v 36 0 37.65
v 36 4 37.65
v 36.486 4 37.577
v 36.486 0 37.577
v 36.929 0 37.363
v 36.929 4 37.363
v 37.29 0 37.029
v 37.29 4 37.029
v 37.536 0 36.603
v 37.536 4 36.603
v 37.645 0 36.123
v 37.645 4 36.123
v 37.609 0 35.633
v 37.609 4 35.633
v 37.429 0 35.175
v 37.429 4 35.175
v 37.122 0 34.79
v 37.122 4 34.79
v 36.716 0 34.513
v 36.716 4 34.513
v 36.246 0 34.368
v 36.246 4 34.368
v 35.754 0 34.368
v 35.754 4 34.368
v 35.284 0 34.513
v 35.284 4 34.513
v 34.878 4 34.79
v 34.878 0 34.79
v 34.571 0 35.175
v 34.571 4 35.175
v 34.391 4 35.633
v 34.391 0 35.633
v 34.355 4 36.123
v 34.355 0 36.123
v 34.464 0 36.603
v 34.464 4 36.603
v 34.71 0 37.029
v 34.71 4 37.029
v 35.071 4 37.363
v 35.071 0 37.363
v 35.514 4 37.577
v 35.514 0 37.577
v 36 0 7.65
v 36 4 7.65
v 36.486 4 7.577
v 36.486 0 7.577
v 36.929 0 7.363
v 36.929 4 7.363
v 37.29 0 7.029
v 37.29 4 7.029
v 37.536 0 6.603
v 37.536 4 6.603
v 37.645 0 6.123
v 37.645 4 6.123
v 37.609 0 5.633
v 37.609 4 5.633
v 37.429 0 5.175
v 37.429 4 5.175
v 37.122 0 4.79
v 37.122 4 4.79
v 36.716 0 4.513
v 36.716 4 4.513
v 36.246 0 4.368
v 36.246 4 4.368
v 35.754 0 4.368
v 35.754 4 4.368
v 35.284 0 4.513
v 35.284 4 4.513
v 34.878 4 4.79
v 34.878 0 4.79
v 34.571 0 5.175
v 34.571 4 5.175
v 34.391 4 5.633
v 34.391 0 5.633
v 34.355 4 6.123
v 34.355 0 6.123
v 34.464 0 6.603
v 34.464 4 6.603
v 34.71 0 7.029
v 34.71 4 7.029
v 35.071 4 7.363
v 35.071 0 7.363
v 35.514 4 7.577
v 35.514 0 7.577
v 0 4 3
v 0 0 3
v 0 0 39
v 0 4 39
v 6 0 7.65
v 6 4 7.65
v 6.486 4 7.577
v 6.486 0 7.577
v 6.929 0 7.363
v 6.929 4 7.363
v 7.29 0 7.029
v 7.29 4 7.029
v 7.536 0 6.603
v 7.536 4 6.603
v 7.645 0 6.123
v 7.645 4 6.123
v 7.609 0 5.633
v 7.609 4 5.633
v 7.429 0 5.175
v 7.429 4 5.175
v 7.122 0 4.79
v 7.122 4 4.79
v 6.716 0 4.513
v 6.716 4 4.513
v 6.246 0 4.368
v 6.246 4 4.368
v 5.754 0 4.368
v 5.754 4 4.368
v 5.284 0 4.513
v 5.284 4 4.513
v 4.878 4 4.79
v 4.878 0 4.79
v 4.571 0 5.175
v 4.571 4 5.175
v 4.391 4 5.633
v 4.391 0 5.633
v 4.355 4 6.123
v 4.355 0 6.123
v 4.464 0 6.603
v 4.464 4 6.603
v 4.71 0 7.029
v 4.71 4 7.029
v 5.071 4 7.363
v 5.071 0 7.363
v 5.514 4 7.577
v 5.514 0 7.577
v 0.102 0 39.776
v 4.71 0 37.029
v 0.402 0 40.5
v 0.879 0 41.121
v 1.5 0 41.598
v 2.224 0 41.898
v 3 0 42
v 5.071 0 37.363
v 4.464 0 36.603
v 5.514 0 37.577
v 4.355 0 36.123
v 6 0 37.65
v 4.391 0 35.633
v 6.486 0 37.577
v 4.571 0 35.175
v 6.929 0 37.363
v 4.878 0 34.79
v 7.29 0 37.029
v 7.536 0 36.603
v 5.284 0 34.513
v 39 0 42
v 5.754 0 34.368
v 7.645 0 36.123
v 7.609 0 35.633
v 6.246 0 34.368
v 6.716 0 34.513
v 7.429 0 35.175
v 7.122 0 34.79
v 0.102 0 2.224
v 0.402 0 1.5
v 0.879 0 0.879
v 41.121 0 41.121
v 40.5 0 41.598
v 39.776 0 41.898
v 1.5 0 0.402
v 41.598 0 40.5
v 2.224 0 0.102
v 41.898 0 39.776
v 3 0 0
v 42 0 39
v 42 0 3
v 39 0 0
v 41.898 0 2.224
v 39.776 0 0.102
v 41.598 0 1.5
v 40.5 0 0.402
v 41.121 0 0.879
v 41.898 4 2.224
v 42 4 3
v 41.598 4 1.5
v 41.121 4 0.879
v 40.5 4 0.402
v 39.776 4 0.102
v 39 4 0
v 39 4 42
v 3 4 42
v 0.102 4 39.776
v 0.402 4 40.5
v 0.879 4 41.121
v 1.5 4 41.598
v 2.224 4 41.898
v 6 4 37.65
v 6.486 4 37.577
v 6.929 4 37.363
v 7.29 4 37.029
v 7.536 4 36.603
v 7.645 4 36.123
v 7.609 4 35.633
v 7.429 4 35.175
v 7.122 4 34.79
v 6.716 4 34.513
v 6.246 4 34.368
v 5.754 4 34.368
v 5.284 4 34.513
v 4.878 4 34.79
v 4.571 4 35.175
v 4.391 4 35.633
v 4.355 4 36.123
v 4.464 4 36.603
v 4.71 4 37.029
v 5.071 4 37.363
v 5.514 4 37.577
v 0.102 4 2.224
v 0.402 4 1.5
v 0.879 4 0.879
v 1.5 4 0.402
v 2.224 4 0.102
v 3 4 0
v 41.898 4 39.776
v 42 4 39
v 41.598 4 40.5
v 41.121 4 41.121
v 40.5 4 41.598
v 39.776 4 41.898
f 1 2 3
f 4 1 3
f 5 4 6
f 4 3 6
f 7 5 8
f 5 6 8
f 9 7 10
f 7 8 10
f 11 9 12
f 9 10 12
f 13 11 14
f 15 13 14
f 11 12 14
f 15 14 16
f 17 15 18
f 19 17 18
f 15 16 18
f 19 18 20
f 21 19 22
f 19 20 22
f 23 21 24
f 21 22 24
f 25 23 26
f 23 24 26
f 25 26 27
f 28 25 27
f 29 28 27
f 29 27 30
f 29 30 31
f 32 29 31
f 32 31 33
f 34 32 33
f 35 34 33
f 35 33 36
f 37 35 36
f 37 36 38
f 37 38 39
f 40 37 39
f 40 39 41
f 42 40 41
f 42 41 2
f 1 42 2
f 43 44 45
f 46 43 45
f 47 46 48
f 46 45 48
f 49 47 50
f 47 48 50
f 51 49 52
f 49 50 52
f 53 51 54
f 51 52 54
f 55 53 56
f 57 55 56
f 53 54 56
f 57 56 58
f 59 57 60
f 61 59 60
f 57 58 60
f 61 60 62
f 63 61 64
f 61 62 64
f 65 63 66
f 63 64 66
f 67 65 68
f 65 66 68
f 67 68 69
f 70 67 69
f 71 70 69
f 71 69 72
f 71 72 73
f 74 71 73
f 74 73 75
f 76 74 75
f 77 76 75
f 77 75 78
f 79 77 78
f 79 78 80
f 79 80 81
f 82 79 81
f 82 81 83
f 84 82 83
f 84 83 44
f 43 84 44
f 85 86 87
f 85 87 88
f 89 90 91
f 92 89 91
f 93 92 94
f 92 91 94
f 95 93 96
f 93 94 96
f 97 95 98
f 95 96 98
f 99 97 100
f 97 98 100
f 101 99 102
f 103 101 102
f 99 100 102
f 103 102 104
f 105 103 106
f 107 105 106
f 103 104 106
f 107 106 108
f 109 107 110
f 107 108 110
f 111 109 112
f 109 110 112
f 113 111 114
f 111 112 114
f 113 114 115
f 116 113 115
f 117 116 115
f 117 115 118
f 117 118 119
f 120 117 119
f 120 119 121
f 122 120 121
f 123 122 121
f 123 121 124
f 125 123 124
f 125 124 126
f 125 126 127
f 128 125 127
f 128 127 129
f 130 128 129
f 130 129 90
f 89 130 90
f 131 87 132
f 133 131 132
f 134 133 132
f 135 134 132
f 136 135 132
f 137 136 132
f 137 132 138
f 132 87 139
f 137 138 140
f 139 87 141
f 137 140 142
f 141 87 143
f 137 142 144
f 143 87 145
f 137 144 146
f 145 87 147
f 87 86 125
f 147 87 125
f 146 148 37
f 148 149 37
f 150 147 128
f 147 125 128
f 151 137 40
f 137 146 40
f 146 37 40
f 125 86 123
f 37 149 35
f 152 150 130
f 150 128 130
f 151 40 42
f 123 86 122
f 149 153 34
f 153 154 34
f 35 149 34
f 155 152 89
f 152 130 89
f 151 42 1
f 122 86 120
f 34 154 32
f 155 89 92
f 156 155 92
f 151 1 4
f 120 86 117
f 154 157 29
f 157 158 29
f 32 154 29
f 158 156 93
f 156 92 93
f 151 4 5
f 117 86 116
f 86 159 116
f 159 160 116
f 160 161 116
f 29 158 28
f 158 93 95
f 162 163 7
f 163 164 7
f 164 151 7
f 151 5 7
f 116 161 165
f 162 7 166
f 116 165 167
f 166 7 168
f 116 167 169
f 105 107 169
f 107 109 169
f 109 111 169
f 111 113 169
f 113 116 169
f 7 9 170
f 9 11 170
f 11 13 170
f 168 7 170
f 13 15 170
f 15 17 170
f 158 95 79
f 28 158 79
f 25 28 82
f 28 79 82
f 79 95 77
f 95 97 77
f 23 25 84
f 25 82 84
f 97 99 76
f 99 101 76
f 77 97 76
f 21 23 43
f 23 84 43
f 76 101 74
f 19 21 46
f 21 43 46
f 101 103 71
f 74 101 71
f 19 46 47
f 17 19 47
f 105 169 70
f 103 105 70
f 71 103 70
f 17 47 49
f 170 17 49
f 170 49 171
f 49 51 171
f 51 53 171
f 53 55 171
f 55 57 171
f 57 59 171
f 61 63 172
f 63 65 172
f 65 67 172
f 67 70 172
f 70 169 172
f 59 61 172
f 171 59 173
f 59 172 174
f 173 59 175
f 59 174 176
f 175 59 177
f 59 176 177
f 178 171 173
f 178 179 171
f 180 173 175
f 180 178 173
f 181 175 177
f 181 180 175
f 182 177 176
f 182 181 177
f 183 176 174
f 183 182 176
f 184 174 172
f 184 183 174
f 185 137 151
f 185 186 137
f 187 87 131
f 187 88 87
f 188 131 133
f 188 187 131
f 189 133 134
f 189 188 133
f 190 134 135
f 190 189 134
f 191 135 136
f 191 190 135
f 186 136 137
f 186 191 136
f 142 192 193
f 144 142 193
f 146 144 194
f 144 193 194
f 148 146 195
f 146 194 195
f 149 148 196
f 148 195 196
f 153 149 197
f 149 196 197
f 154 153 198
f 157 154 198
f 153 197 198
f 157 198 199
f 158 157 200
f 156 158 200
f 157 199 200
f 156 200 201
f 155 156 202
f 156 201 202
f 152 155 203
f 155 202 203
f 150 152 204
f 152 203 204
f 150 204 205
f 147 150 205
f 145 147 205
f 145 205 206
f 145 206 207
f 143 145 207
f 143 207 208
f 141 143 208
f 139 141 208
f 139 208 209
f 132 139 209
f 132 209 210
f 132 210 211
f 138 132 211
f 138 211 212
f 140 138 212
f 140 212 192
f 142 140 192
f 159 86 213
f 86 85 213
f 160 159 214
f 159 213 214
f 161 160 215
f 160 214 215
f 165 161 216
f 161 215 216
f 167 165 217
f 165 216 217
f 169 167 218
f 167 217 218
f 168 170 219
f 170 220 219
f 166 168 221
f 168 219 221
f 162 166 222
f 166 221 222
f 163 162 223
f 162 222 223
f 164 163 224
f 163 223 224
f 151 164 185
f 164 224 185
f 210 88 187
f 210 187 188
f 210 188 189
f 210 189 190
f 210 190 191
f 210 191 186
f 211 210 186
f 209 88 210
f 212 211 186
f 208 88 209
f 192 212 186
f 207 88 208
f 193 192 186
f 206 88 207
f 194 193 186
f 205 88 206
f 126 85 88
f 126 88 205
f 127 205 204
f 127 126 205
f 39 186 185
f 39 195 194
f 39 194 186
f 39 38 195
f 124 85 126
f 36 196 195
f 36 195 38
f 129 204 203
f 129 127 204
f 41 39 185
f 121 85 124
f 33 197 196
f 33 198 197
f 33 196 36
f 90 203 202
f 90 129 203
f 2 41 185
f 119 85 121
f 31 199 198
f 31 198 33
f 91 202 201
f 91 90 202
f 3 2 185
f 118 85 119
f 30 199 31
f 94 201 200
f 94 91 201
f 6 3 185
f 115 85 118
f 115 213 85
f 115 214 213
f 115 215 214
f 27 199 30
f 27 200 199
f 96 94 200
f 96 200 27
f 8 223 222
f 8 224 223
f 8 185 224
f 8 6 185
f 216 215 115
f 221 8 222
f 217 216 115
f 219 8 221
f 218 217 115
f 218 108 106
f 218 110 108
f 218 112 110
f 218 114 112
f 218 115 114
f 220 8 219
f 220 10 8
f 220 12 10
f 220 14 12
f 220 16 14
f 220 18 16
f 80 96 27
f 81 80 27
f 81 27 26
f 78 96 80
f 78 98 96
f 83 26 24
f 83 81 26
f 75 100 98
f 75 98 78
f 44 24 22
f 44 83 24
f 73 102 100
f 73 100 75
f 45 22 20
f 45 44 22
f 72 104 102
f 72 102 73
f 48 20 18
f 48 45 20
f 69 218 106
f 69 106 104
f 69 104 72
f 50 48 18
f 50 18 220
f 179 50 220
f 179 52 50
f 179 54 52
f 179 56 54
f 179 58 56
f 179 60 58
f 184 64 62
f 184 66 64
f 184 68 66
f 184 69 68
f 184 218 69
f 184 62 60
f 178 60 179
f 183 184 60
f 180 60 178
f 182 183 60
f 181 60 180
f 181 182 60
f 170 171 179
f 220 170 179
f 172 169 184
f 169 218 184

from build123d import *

# Parameters (mm, degrees)
SKETCH_1_W          = 42
SKETCH_1_H          = 4
BLOCKEXTRUDE_DEPTH  = 42
FILLET_2_R          = 3
SKETCH_2_R          = 1.65
MOUNT_HOLE_DEPTH    = 60.531504265
SKETCH_3_R          = 1.65
CUT_EXTRUDE_2_DEPTH = 60.531504265
SKETCH_4_R          = 1.65
CUT_EXTRUDE_3_DEPTH = 60.531504265
SKETCH_5_R          = 1.65
CUT_EXTRUDE_4_DEPTH = 60.531504265


with BuildPart() as part:
    # 草图1 → BlockExtrude (new body)
    with BuildSketch(Plane.XY):
        with Locations((21, 2)):
            Rectangle(SKETCH_1_W, SKETCH_1_H)
    extrude(amount=BLOCKEXTRUDE_DEPTH)

    # Fillet 2
    fillet_2_edges = [part.edges().sort_by_distance(p)[0] for p in [
        (42, 2, 42),
        (0, 2, 42),
        (42, 2, 0),
        (0, 2, 0),
    ]]
    fillet(fillet_2_edges, radius=FILLET_2_R)

    # 草图2 → Mount_hole (cut, through all)
    with BuildSketch(Plane(origin=(0, 4, 0), x_dir=(1, 0, 0), z_dir=(0, 1, 0))):
        with Locations(Location((6, -6, 0), (0, 0, 270))):
            Circle(SKETCH_2_R)
    extrude(amount=-MOUNT_HOLE_DEPTH, mode=Mode.SUBTRACT)

    # 草图3 → 切除-拉伸2 (cut, through all)
    with BuildSketch(Plane(origin=(0, 4, 0), x_dir=(1, 0, 0), z_dir=(0, 1, 0))):
        with Locations(Location((6, -36, 0), (0, 0, 270))):
            Circle(SKETCH_3_R)
    extrude(amount=-CUT_EXTRUDE_2_DEPTH, mode=Mode.SUBTRACT)

    # 草图4 → 切除-拉伸3 (cut, through all)
    with BuildSketch(Plane(origin=(0, 4, 0), x_dir=(1, 0, 0), z_dir=(0, 1, 0))):
        with Locations(Location((36, -6, 0), (0, 0, 270))):
            Circle(SKETCH_4_R)
    extrude(amount=-CUT_EXTRUDE_3_DEPTH, mode=Mode.SUBTRACT)

    # 草图5 → 切除-拉伸4 (cut, through all)
    with BuildSketch(Plane(origin=(0, 4, 0), x_dir=(1, 0, 0), z_dir=(0, 1, 0))):
        with Locations(Location((36, -36, 0), (0, 0, 270))):
            Circle(SKETCH_5_R)
    extrude(amount=-CUT_EXTRUDE_4_DEPTH, mode=Mode.SUBTRACT)


solid = part.part
